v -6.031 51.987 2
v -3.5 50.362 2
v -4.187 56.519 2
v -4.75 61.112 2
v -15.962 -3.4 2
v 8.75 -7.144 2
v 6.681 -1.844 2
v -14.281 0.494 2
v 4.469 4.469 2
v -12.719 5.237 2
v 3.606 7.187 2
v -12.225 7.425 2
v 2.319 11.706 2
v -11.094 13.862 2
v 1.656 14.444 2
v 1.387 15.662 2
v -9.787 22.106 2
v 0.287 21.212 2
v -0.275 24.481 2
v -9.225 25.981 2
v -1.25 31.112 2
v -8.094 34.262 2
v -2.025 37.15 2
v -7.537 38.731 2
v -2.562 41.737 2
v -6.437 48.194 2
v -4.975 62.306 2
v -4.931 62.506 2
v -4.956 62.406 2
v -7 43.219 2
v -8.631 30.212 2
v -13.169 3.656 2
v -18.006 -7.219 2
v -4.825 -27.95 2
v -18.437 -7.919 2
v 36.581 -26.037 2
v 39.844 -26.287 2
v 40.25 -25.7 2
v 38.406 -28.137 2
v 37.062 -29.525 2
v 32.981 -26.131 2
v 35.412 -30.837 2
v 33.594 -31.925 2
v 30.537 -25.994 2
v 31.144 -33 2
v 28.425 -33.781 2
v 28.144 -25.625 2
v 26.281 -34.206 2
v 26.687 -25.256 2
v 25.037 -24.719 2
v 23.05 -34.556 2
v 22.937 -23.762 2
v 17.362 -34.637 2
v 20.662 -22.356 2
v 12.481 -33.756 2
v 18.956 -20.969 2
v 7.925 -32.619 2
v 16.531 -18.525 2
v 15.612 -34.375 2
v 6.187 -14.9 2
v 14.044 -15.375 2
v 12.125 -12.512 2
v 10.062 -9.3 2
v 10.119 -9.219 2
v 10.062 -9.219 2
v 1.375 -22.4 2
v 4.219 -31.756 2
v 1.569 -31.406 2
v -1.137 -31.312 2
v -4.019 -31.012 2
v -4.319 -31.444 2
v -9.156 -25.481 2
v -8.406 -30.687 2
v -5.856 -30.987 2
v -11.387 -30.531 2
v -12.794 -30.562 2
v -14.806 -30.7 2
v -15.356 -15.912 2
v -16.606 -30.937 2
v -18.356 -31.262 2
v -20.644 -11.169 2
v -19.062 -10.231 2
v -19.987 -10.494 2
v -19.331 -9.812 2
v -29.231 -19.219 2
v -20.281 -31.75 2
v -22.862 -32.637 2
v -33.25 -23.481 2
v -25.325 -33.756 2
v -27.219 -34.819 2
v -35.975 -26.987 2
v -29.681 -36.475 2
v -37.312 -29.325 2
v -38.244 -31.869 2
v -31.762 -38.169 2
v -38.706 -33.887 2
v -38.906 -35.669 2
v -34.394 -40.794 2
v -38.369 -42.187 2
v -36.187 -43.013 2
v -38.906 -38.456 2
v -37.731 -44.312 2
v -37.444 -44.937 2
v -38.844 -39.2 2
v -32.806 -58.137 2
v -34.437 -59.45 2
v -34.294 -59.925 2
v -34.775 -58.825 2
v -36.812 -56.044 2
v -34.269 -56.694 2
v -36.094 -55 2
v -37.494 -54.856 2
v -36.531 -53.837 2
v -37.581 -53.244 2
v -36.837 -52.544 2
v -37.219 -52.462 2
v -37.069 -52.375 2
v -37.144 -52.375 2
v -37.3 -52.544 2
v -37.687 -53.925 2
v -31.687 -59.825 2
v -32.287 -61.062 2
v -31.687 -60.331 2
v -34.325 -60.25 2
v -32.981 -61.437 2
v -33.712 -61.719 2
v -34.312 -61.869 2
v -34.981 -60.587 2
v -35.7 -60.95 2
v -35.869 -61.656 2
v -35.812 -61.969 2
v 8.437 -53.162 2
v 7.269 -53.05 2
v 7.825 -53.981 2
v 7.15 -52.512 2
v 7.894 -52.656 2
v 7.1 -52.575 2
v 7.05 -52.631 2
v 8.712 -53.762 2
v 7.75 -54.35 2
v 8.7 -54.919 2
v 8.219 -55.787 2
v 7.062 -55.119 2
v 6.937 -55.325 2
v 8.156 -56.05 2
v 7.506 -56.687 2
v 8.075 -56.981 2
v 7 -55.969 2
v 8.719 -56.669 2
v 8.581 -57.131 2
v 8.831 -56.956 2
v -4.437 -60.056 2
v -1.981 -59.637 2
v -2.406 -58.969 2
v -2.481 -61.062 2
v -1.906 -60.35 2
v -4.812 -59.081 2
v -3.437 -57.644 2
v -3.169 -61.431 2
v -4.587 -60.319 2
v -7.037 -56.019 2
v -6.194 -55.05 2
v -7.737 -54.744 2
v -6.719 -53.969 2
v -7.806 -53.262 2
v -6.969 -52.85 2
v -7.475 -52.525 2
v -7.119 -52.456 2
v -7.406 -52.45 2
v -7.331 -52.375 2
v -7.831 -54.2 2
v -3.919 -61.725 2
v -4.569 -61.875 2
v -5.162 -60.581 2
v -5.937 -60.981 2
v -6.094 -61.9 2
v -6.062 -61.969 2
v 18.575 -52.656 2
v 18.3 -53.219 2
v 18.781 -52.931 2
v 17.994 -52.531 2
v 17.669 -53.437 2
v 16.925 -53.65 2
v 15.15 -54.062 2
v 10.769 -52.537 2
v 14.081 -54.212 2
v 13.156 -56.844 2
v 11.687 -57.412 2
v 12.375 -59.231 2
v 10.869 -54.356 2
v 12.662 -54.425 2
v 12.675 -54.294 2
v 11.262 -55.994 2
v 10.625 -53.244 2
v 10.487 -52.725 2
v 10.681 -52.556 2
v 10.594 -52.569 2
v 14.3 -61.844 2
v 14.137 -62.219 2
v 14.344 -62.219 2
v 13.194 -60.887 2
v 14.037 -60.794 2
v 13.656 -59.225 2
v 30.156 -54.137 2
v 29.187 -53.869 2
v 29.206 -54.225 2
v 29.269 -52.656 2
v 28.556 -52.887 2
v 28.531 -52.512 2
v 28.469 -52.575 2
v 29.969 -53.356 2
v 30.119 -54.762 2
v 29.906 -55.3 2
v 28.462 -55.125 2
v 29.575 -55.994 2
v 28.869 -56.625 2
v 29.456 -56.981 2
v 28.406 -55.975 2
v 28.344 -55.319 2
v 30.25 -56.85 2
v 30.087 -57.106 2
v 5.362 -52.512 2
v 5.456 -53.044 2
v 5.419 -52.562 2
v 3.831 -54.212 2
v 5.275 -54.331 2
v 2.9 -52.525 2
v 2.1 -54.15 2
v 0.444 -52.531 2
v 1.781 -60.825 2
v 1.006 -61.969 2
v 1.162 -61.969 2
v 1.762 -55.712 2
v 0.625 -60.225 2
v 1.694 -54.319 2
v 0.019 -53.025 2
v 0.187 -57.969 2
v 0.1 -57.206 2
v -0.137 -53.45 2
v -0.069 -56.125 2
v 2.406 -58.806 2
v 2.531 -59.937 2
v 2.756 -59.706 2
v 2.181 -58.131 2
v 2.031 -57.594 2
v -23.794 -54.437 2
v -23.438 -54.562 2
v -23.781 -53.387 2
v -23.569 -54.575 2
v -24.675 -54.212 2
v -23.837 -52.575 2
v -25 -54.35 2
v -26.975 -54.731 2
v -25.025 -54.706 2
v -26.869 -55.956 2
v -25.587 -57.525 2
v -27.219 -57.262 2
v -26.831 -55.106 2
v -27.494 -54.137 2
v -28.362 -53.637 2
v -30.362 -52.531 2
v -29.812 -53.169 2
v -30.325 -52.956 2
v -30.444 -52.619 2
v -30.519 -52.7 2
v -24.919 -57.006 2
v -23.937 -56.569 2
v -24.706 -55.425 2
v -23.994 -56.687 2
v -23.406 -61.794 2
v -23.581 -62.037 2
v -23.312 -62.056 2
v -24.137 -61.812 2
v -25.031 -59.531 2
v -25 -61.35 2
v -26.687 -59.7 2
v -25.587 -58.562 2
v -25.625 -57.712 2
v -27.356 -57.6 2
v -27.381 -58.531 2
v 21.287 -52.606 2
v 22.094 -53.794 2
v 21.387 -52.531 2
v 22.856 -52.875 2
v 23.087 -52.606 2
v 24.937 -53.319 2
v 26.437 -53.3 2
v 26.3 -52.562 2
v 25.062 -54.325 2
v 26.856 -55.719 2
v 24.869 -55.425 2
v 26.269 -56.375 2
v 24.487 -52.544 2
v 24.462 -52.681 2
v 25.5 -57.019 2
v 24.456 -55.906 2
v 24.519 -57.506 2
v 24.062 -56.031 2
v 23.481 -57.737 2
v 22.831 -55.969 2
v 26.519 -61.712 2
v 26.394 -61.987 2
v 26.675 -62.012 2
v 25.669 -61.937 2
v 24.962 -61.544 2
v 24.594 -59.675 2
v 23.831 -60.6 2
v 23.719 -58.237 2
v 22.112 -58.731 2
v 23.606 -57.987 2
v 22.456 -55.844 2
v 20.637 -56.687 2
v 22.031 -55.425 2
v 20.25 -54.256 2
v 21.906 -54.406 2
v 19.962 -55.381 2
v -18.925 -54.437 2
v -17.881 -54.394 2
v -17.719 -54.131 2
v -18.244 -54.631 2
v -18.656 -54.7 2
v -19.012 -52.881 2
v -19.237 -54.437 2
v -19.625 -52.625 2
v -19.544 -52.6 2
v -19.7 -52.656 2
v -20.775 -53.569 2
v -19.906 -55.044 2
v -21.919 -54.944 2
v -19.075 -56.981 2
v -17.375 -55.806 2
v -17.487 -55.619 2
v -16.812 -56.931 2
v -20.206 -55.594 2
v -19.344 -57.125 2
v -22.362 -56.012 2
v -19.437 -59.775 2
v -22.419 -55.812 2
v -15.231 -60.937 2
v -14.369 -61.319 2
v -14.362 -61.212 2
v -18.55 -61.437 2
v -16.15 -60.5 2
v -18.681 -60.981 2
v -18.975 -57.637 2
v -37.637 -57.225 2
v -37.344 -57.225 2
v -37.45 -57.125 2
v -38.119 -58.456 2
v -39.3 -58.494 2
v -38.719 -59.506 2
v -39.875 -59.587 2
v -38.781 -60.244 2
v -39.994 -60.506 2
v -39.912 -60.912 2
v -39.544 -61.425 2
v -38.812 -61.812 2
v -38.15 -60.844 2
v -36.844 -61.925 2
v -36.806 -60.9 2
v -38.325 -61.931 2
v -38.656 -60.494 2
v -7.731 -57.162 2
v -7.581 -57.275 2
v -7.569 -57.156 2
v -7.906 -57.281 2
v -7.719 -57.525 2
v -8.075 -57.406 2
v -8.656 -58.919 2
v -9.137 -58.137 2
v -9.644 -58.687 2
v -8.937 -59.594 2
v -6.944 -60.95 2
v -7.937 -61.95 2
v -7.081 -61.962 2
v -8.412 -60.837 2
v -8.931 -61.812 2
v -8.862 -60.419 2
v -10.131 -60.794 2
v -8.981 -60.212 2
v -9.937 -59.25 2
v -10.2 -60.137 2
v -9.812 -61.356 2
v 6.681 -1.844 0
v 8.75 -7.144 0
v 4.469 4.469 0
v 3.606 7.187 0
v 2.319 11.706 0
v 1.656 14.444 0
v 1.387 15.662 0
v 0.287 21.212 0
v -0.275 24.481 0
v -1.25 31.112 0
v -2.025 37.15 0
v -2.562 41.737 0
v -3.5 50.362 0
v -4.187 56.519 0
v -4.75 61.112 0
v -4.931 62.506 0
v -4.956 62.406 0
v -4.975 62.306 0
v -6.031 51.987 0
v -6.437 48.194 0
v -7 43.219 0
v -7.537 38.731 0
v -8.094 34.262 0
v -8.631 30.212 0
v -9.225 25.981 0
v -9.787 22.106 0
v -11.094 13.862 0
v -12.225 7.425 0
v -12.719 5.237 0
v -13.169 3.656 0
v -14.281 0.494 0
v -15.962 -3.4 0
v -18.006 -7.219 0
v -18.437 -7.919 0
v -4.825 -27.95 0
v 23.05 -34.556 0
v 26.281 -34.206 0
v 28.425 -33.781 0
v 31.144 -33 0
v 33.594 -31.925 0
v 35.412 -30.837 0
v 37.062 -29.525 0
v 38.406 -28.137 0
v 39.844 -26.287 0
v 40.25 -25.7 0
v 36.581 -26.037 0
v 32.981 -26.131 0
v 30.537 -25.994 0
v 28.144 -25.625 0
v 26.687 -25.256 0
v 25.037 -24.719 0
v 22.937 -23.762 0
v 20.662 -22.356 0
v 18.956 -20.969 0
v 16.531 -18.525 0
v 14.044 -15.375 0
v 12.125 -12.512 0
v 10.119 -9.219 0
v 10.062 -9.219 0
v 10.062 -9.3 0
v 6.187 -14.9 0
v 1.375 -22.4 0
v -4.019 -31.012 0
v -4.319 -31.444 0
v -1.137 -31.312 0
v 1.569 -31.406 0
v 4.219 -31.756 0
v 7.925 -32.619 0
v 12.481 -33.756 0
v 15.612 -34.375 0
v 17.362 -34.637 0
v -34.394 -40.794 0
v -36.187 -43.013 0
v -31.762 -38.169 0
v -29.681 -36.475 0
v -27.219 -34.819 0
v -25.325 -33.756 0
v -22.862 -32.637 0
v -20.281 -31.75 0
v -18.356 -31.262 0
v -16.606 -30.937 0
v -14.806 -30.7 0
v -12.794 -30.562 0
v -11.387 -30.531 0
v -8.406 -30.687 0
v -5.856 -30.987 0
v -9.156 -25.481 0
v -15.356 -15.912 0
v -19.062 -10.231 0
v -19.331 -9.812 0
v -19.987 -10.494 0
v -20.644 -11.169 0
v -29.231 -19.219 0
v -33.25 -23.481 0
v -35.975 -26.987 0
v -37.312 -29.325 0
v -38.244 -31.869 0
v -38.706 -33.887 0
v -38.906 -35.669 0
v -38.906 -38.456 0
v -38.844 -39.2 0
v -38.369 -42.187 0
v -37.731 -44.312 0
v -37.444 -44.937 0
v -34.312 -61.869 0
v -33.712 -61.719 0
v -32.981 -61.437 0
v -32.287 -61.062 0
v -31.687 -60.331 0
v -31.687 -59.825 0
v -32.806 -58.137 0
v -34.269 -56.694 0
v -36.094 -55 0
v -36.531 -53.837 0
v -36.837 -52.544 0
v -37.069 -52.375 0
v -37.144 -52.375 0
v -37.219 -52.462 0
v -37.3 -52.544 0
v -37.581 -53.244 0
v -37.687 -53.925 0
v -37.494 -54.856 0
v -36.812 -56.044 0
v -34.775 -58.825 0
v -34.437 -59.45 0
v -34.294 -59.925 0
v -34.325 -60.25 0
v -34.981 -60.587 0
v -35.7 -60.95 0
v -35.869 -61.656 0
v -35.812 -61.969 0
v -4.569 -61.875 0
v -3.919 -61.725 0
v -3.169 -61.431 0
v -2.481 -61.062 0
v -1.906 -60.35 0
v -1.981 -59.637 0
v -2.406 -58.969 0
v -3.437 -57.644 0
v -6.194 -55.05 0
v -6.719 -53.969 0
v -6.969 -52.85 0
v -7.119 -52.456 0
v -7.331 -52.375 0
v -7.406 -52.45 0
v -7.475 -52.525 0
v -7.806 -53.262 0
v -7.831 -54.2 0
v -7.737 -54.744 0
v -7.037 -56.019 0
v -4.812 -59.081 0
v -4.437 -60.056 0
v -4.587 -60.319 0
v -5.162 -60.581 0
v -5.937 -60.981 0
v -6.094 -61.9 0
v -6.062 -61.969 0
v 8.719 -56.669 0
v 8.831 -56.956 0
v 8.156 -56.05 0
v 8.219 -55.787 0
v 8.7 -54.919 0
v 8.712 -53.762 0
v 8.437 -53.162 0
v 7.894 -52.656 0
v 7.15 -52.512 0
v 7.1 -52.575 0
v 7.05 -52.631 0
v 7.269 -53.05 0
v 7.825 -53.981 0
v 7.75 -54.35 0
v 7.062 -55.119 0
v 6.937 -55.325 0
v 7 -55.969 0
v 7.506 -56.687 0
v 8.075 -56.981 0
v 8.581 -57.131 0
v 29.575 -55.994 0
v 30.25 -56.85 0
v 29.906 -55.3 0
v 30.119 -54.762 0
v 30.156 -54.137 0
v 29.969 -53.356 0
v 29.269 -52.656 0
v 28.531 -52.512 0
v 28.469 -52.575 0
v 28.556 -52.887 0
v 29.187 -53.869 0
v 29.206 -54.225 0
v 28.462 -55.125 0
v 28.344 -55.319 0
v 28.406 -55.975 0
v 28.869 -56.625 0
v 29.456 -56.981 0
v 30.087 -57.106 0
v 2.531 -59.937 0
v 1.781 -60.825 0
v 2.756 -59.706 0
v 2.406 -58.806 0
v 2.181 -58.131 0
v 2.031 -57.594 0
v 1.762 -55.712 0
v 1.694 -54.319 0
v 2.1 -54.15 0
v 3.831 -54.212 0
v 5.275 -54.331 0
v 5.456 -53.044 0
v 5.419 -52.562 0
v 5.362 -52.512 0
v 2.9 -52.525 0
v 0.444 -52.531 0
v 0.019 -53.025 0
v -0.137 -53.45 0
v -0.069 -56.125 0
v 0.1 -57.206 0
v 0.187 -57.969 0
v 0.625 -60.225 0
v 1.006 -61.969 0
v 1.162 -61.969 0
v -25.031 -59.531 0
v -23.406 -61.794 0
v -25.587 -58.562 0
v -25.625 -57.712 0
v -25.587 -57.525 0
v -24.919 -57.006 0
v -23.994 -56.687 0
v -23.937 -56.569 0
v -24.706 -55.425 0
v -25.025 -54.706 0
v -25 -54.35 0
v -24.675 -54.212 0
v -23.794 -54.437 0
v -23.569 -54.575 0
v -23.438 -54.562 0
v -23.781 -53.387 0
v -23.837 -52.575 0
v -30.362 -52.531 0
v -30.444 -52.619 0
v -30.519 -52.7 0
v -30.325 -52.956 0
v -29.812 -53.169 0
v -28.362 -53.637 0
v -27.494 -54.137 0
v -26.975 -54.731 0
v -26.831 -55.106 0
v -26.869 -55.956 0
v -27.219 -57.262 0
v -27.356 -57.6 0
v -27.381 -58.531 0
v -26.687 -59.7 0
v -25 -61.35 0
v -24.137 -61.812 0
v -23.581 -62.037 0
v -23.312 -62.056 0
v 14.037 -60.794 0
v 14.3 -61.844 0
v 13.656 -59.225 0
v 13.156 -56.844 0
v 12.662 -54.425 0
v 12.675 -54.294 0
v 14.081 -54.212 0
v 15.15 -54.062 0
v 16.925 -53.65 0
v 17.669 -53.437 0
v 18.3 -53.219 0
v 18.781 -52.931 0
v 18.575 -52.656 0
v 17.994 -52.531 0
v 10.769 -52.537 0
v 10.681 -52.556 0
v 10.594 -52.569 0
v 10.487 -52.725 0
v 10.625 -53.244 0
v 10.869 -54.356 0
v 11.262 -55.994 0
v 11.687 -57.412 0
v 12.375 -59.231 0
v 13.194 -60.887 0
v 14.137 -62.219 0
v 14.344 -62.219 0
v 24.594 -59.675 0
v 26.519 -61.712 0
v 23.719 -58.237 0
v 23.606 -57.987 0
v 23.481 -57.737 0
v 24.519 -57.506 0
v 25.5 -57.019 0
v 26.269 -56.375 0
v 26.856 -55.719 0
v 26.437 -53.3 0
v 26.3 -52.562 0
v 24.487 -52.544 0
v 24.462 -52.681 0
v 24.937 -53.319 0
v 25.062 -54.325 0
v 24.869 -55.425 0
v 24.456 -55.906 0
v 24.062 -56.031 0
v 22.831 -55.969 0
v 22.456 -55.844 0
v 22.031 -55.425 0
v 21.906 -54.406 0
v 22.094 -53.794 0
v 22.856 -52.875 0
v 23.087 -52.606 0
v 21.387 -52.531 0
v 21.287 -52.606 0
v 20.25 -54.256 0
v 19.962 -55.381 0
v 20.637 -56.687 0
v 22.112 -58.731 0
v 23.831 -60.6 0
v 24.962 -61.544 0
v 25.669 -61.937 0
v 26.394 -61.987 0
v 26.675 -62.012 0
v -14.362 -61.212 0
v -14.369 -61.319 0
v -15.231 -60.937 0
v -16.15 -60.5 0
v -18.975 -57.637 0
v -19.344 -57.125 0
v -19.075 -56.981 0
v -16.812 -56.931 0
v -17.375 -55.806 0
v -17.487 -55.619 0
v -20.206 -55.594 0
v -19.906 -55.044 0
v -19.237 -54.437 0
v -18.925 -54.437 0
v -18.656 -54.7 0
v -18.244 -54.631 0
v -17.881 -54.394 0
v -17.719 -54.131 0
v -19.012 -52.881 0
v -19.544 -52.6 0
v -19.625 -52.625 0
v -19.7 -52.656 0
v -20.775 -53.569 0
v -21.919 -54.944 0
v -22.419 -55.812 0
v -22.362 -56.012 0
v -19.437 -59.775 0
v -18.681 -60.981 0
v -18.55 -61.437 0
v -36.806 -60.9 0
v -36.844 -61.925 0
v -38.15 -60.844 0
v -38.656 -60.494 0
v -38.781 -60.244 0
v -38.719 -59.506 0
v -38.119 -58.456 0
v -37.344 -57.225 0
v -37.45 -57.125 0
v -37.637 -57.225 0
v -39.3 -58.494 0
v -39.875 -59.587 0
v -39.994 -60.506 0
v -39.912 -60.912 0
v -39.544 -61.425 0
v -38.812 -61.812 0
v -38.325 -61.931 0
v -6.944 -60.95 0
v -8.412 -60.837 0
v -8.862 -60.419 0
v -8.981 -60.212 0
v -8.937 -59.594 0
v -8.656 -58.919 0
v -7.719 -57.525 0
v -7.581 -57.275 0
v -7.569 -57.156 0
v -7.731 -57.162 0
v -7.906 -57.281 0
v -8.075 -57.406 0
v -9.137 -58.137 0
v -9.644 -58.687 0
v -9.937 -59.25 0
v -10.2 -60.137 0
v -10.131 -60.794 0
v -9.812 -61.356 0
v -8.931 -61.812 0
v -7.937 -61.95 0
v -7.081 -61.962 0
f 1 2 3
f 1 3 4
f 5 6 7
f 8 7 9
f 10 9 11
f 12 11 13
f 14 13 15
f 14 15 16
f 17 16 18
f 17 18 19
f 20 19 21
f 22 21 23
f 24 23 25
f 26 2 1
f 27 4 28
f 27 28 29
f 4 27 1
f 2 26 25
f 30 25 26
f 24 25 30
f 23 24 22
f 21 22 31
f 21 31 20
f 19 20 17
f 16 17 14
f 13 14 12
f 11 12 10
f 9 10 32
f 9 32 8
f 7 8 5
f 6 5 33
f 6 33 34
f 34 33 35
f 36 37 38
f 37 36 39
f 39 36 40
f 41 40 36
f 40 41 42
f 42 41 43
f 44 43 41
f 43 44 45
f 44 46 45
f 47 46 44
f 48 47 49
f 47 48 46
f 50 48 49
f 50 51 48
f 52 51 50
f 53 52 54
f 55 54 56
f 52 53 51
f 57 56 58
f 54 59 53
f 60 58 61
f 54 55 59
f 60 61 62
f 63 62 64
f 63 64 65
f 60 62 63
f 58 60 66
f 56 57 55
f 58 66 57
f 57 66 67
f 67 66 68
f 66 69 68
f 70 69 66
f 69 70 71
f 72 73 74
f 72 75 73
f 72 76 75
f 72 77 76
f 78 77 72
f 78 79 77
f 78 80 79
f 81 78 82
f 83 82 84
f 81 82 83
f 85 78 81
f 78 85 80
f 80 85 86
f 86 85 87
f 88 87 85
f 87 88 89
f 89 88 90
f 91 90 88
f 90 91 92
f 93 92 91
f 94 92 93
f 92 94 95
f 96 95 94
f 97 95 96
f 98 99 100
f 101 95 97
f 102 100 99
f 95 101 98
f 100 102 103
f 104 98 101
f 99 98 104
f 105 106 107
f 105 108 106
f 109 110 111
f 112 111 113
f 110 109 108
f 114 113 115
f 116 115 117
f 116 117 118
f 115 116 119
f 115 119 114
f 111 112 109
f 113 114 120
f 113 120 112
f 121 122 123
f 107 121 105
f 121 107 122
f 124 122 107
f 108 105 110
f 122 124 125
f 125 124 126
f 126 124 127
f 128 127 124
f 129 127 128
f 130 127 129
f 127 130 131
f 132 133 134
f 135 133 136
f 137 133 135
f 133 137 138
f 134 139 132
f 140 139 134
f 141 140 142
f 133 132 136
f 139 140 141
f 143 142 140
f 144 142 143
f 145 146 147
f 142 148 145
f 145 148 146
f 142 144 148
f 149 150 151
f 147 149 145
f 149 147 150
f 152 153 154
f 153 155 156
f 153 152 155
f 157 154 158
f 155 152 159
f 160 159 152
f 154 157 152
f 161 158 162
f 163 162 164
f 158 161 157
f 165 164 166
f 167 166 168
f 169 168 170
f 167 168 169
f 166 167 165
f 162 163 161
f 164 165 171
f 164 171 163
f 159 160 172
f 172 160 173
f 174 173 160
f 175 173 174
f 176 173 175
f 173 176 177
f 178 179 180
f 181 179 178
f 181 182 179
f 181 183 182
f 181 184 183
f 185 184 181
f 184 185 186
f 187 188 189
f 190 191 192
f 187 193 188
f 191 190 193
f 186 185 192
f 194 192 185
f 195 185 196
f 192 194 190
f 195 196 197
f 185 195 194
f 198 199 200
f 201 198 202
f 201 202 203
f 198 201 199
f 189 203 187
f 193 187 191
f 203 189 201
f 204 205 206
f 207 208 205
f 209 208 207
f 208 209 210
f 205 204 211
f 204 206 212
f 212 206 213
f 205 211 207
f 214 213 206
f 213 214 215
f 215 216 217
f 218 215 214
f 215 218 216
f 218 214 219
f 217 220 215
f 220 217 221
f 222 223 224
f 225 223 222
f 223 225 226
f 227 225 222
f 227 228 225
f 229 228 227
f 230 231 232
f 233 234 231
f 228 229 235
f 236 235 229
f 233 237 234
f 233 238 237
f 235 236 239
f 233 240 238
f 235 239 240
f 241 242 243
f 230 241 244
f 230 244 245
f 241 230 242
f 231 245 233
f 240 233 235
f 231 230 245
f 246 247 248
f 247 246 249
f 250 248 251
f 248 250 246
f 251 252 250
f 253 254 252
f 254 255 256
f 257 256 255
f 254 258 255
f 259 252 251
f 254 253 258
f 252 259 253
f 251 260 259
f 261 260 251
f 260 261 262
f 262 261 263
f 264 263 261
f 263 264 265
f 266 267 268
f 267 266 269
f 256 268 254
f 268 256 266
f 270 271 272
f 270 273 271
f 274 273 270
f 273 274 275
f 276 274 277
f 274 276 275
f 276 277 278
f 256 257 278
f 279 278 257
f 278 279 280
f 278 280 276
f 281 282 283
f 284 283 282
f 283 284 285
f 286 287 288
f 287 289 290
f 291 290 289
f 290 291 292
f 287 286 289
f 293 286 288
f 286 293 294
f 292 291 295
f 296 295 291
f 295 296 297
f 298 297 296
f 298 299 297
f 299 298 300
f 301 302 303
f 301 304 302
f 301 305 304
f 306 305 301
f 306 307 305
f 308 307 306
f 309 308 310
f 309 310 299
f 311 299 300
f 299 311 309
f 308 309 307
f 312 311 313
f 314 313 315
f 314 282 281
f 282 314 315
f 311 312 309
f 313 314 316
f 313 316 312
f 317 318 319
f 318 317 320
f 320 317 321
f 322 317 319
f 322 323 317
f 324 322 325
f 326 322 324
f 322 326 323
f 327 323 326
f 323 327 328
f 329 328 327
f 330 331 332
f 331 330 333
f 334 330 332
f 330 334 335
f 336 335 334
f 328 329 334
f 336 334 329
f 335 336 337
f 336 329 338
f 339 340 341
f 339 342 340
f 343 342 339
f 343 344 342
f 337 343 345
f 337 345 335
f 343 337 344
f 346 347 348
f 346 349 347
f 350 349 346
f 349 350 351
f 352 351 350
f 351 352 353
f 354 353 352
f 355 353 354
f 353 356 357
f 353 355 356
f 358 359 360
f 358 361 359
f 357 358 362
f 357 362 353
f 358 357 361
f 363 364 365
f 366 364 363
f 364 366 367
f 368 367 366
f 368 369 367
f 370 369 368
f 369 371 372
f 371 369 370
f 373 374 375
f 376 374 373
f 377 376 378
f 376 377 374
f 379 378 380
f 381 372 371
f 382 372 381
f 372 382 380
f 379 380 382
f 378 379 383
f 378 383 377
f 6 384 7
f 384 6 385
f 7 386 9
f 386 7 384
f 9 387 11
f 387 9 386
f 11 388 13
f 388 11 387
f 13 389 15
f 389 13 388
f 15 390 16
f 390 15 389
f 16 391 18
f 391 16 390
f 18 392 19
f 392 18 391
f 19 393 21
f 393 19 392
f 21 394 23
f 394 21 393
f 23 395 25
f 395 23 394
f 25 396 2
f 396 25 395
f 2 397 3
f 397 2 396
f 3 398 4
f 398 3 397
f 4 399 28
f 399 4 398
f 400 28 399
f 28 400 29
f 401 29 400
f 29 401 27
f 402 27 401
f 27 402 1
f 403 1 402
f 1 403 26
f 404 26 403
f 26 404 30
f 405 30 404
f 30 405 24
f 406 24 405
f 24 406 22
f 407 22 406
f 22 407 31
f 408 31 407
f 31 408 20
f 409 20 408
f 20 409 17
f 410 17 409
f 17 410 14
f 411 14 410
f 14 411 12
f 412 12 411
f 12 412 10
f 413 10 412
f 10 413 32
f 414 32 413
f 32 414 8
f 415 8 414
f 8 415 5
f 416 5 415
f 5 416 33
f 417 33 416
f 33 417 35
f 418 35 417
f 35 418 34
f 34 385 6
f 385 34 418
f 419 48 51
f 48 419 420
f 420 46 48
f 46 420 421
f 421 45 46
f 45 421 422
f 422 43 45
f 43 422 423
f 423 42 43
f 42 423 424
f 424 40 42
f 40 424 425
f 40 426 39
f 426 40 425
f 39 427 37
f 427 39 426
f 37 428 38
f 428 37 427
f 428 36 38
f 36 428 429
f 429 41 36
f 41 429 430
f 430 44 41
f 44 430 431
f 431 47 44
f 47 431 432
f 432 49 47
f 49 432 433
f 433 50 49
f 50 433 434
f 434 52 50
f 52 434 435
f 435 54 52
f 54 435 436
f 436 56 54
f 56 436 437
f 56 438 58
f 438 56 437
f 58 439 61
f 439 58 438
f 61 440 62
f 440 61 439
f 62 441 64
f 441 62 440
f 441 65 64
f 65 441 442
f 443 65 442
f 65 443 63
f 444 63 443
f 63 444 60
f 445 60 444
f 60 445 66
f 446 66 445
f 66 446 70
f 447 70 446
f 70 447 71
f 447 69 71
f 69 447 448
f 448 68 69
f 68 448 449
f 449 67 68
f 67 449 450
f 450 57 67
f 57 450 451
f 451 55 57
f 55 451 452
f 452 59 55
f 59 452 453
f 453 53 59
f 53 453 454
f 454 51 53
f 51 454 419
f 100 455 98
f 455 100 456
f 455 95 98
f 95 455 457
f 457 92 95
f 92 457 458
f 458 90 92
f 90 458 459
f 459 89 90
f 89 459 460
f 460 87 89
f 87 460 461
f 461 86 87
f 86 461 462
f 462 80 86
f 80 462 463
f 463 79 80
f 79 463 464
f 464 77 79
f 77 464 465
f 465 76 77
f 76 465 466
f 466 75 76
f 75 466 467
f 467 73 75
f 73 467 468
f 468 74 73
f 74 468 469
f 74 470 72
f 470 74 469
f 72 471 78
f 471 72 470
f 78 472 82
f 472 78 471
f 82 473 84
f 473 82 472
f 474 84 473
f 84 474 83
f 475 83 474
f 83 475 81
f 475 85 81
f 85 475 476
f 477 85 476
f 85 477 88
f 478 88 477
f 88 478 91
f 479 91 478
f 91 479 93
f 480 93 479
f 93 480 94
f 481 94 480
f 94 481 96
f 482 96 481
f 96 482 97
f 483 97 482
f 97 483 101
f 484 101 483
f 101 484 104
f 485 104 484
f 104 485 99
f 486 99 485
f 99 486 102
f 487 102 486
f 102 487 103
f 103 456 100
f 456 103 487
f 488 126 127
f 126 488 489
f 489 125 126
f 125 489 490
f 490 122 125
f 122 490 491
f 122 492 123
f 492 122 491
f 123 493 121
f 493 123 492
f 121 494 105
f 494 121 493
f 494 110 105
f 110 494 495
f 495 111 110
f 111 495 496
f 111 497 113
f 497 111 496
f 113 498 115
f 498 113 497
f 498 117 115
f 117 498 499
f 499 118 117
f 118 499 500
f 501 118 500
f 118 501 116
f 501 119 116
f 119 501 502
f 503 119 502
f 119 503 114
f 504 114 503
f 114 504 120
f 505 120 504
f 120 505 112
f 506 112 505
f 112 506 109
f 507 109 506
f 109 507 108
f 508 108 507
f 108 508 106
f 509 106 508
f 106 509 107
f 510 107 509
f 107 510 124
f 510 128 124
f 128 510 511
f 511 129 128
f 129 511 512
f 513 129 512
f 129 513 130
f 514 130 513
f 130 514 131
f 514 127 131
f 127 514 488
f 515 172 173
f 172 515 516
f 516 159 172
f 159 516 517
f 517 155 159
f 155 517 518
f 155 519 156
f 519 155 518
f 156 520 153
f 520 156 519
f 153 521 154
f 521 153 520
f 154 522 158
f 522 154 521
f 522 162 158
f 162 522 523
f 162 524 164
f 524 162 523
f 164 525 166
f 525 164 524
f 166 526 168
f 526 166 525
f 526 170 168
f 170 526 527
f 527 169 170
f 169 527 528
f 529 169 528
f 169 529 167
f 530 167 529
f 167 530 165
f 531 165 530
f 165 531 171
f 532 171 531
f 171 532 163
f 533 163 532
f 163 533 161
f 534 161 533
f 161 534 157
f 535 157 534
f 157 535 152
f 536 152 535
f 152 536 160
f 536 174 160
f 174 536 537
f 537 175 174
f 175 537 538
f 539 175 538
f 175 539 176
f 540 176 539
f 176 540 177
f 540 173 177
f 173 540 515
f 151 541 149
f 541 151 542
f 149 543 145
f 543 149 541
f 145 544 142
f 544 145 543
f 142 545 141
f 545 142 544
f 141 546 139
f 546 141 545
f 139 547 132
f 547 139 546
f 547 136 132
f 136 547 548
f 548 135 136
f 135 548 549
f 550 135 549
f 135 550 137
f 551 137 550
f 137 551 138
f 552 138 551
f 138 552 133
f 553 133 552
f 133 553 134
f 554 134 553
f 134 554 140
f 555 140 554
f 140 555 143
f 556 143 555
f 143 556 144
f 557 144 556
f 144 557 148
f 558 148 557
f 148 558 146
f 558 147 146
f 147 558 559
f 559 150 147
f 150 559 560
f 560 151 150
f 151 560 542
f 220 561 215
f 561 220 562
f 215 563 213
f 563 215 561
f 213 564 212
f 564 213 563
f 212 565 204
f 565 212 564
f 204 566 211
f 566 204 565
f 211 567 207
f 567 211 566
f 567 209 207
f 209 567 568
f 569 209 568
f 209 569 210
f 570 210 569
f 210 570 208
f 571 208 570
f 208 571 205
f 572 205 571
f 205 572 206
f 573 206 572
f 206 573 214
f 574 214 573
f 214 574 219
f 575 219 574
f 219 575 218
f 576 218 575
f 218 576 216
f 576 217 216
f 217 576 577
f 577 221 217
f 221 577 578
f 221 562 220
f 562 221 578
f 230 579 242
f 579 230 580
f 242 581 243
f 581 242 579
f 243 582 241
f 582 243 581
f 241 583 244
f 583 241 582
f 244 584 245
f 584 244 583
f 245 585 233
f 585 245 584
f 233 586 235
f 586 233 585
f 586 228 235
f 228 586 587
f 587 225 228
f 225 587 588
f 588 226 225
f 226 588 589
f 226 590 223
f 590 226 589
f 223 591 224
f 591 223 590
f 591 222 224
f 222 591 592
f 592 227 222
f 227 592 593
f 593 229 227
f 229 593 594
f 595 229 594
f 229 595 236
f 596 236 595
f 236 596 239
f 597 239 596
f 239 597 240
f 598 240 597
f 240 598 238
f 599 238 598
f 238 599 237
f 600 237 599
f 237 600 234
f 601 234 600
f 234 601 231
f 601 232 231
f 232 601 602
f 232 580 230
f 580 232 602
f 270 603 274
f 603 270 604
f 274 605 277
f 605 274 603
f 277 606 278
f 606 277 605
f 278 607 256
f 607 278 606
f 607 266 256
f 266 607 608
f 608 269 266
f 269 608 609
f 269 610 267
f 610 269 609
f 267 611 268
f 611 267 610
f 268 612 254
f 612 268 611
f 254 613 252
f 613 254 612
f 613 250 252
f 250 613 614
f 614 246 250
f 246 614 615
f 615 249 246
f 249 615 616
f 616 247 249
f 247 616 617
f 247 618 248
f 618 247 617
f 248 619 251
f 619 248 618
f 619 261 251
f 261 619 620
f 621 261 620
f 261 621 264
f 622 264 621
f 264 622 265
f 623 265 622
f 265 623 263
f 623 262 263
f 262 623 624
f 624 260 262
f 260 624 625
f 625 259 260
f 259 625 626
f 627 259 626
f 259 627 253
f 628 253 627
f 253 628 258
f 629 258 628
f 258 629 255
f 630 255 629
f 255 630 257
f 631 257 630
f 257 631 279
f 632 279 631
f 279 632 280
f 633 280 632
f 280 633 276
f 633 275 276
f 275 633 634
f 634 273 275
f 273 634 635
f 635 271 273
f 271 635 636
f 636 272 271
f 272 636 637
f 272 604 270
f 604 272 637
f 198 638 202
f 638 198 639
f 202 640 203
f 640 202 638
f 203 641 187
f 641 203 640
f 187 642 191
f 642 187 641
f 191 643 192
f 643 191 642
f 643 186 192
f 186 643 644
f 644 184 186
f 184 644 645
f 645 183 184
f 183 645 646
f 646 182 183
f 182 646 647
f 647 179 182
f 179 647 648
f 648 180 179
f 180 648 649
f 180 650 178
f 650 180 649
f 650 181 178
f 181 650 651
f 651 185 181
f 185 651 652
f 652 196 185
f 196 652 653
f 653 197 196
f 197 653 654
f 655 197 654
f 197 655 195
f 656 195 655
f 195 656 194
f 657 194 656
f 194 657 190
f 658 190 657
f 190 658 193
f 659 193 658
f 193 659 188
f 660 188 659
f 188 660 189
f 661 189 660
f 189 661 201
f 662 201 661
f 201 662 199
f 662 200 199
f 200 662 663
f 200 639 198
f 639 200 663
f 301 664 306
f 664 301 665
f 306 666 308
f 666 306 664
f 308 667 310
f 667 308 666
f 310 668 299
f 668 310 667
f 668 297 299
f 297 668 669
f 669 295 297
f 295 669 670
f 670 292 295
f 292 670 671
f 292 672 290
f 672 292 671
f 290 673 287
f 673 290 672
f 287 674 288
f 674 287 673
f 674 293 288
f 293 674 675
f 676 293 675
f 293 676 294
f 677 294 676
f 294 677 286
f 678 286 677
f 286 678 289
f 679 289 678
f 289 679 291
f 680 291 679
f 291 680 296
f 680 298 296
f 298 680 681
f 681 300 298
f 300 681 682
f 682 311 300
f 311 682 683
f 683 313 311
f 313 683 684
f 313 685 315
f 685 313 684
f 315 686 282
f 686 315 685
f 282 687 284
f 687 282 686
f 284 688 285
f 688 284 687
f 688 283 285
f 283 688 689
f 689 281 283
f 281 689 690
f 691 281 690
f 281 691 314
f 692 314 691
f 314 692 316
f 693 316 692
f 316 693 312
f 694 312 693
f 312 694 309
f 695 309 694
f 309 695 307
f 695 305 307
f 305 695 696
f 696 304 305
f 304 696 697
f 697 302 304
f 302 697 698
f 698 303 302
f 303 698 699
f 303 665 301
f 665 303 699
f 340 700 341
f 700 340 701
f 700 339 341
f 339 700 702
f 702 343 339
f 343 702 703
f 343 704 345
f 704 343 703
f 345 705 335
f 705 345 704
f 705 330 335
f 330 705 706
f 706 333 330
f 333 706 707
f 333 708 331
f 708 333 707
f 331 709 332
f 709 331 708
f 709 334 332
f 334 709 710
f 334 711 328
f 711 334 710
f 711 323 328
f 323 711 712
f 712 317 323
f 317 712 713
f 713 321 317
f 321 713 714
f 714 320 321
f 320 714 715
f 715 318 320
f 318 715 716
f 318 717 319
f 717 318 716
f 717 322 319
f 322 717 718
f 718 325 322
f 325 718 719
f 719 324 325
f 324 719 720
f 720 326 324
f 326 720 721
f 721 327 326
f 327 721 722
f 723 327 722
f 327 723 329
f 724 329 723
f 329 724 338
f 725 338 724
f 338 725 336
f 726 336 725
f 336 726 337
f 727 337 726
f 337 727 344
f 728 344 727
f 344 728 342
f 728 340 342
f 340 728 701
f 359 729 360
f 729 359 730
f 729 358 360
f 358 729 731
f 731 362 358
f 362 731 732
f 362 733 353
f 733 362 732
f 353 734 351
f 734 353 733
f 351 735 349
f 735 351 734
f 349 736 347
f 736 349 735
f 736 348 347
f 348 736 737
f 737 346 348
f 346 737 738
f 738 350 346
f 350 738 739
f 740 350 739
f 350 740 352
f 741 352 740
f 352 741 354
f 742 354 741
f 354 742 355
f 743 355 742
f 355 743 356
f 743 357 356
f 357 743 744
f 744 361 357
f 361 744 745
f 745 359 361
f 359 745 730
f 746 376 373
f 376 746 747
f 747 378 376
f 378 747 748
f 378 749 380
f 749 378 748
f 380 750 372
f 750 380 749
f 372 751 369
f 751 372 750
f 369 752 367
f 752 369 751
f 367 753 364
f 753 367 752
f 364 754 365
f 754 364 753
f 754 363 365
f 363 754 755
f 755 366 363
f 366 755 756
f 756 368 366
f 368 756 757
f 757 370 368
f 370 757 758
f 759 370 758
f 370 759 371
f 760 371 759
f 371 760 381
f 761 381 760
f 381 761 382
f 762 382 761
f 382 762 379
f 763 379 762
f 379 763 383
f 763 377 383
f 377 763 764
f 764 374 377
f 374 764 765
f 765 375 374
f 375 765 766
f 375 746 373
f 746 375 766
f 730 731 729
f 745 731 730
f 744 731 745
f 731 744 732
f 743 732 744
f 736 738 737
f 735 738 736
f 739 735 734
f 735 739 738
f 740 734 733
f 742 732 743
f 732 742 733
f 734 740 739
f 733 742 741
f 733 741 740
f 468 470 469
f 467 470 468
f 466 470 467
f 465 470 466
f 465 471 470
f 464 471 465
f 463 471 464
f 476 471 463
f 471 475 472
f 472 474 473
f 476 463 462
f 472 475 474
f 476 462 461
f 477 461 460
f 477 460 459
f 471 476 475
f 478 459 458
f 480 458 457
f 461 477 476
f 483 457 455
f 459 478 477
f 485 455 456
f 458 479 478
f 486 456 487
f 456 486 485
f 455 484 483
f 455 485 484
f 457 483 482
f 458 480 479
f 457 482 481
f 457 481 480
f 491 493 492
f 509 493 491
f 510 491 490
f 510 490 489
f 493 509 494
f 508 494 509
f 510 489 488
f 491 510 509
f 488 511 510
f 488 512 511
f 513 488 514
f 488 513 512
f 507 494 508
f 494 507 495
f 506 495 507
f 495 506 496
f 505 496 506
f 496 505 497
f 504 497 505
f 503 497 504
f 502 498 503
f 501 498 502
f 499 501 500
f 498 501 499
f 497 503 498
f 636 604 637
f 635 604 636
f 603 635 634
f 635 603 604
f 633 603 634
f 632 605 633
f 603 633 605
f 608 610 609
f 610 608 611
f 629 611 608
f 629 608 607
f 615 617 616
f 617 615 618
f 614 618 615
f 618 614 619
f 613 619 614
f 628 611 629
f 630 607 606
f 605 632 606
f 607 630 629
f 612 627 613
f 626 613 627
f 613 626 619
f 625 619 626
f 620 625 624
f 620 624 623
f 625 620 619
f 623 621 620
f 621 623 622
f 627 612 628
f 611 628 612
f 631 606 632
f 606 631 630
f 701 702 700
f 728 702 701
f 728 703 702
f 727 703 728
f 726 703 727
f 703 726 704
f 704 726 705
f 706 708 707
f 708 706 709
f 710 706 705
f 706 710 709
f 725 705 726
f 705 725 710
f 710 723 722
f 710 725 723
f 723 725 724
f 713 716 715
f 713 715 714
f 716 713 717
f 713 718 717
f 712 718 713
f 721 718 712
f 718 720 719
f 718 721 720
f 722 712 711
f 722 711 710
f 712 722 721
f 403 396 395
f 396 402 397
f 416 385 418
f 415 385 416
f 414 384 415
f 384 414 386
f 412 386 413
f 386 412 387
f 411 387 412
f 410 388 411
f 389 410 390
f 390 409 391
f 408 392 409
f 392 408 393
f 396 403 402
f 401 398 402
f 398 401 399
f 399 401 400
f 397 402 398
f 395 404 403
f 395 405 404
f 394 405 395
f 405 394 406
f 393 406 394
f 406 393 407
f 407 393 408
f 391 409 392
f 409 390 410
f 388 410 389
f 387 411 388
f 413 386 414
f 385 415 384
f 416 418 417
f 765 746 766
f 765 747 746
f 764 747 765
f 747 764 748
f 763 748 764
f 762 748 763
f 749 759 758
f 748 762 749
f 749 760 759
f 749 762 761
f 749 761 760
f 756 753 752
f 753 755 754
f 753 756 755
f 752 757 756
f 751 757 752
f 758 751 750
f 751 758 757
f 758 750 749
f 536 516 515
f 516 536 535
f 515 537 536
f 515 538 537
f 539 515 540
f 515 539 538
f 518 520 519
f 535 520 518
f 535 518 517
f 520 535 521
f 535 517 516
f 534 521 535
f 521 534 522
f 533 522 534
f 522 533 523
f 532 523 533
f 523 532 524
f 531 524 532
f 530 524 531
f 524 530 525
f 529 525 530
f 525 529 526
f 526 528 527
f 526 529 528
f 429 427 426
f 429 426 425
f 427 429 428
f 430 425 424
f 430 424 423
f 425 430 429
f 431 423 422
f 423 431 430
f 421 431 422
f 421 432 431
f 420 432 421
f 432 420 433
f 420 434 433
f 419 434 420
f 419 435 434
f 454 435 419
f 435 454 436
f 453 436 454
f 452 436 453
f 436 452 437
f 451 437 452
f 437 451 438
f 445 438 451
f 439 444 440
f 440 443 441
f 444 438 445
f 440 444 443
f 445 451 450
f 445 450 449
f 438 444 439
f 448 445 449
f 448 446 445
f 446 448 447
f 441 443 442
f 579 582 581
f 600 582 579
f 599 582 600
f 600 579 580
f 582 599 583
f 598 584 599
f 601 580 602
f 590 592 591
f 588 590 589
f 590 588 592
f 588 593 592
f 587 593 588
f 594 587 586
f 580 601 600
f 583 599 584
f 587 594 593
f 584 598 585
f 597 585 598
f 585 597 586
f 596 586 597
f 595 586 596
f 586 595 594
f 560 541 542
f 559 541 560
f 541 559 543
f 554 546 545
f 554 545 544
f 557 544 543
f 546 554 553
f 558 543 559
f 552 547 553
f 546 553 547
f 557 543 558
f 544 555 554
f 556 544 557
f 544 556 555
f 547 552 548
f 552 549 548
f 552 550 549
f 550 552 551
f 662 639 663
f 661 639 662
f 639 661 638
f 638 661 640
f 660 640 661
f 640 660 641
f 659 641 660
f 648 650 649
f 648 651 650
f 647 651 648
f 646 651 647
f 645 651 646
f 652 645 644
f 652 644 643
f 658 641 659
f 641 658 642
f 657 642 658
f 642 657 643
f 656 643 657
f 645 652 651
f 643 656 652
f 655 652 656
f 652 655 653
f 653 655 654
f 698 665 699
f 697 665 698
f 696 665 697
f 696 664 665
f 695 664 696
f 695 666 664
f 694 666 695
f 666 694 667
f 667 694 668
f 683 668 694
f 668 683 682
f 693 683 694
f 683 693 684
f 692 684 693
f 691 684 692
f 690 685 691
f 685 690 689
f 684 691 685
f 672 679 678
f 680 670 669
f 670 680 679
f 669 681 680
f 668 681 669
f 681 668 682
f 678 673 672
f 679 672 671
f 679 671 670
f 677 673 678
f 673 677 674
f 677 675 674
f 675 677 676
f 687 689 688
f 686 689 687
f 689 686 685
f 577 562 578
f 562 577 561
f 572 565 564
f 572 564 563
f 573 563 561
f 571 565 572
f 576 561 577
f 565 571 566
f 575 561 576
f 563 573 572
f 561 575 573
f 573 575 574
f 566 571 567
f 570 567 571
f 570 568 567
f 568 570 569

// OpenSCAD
module 5514f697e4bc7c70c16036072a6024b7_1()
{
 /* Generated by trace2scad version 20150415
    http://aggregate.org/MAKE/TRACE2SCAD/
    Optimized model has 387/4796 original points
 */
 color([0.48, 0.48, 0.48])
 assign(minx=0) /* polygon minx=39 */
 assign(miny=0) /* polygon miny=45 */
 assign(maxx=12880) /* polygon maxx=12880 */
 assign(maxy=20000) /* polygon maxy=20001 */
 assign(dx=maxx-minx)
 assign(dy=maxy-miny)
 assign(maxd=((dx>dy)?dx:dy))
 scale([1/maxd, 1/maxd, 1])
 translate([-minx-dx/2, -miny-dy/2, 0])
 linear_extrude(height=1, convexity=387)
 union() {
  union() {
   polygon([[5647,19985],[5644,19969],[5475,18318],[5410,17711],[5320,16915],[5234,16197],[5145,15482],[5059,14834],[4964,14157],[4874,13537],[4665,12218],[4484,11188],[4405,10838],[4333,10585],[4155,10079],[3886,9456],[3559,8845],[3490,8733],[5668,5528],[7840,8857],[7509,9705],[7155,10715],[7017,11150],[6811,11873],[6705,12311],[6662,12506],[6486,13394],[6396,13917],[6240,14978],[6116,15944],[6030,16678],[5880,18058],[5770,19043],[5680,19778],[5651,20001]], convexity=6);
   polygon([[8050,8518],[8050,8512],[7430,7616],[6660,6416],[5797,5038],[5749,4969],[6258,4990],[6691,4975],[7115,4919],[7708,4781],[8437,4599],[8938,4500],[9218,4458],[10128,4471],[10645,4527],[10988,4595],[11423,4720],[11815,4892],[12106,5066],[12370,5276],[12585,5498],[12815,5794],[12880,5888],[12293,5834],[11717,5819],[11326,5841],[10943,5900],[10710,5959],[10446,6045],[10110,6198],[9746,6423],[9473,6645],[9085,7036],[8687,7540],[8380,7998],[8059,8525],[8050,8525]], convexity=9);
   polygon([[3242,8321],[3137,8213],[1763,6925],[1120,6243],[684,5682],[470,5308],[321,4901],[247,4578],[215,4293],[215,3847],[225,3728],[301,3250],[403,2910],[449,2810],[650,3118],[937,3473],[1358,3893],[1691,4164],[2085,4429],[2388,4599],[2782,4778],[3195,4920],[3503,4998],[3783,5050],[4071,5088],[4393,5110],[4618,5115],[5095,5090],[5503,5042],[4975,5923],[3983,7454],[3390,8363],[3347,8430]], convexity=7);
   polygon([[485,1606],[472,1593],[427,1481],[410,1372],[441,1223],[550,1033],[876,588],[930,488],[953,412],[948,360],[843,306],[728,248],[701,135],[710,85],[950,101],[1046,125],[1163,170],[1274,230],[1370,347],[1370,428],[1191,698],[957,929],[665,1200],[595,1386],[546,1593],[509,1620],[497,1620]], convexity=8);
   polygon([[5255,1608],[5244,1596],[5191,1478],[5187,1328],[5202,1241],[5314,1037],[5670,547],[5730,391],[5706,349],[5614,307],[5490,243],[5465,96],[5470,85],[5709,100],[5813,124],[5933,171],[6043,230],[6135,344],[6123,458],[6055,565],[5890,777],[5449,1192],[5365,1365],[5325,1544],[5301,1607],[5267,1620]], convexity=8);
   polygon([[6904,1596],[6511,1595],[6443,1516],[6418,1448],[6429,1020],[6456,847],[6470,725],[6540,364],[6601,85],[6626,85],[6725,268],[6845,410],[6881,447],[6825,591],[6789,699],[6765,785],[6722,1086],[6711,1309],[6776,1336],[7053,1326],[7284,1307],[7313,1513],[7307,1590],[7298,1598]], convexity=10);
   polygon([[7576,1588],[7568,1579],[7603,1512],[7692,1363],[7680,1304],[7570,1181],[7550,1148],[7560,1045],[7641,930],[7732,883],[7813,859],[7853,887],[7835,933],[7745,1032],[7755,1074],[7832,1213],[7834,1398],[7790,1494],[7703,1575],[7584,1598]], convexity=10);
   polygon([[11000,1593],[10995,1588],[11009,1538],[11110,1381],[11113,1324],[10994,1180],[10975,1149],[10985,1044],[11059,940],[11153,883],[11254,863],[11280,904],[11172,1041],[11225,1152],[11259,1238],[11265,1338],[11235,1463],[11123,1575],[11005,1598]], convexity=10);
   polygon([[1569,1581],[1557,1568],[1588,1527],[1670,1493],[1902,1418],[2041,1338],[2124,1243],[2147,1183],[2141,1047],[2085,838],[2063,784],[2059,635],[2170,448],[2440,184],[2578,110],[2667,74],[2710,71],[2695,113],[2435,475],[2346,630],[2340,766],[2346,796],[2453,879],[2601,930],[2610,949],[2487,1132],[2436,1247],[2440,1304],[2492,1326],[2633,1290],[2669,1268],[2690,1270],[2635,1458],[2626,1588],[1582,1595]], convexity=13);
   polygon([[8149,1591],[8135,1589],[8118,1564],[8140,1481],[8179,1303],[8242,1041],[8310,814],[8420,523],[8551,258],[8702,45],[8735,45],[8728,105],[8686,273],[8625,524],[8545,905],[8466,1292],[8468,1313],[8693,1326],[8864,1350],[9148,1416],[9267,1450],[9368,1485],[9445,1531],[9412,1575],[9319,1595],[8163,1594]], convexity=9);
   polygon([[9854,1589],[9846,1583],[9680,1319],[9634,1139],[9742,930],[9978,603],[10253,304],[10434,153],[10547,90],[10663,82],[10708,78],[10683,126],[10375,452],[10235,682],[10217,722],[10197,762],[10363,799],[10520,877],[10643,980],[10737,1085],[10670,1472],[10648,1590],[10358,1593],[10354,1571],[10430,1469],[10450,1308],[10419,1132],[10353,1055],[10290,1035],[10093,1045],[10033,1065],[9965,1132],[9945,1295],[9975,1393],[10097,1540],[10134,1583],[9862,1595]], convexity=13);
   polygon([[3300,1580],[3288,1575],[3116,1429],[2933,1209],[2853,1070],[2862,1038],[3330,436],[3451,243],[3472,170],[4141,189],[4142,206],[4003,250],[3856,320],[3404,778],[3345,860],[3388,883],[3750,891],[3660,1071],[3642,1101],[3207,1105],[3255,1193],[3362,1290],[3412,1290],[3455,1248],[3521,1259],[3579,1297],[3605,1339],[3398,1539],[3313,1584]], convexity=12);
   polygon([[433,852],[418,844],[152,641],[60,466],[41,319],[54,254],[113,172],[230,110],[308,91],[545,92],[551,256],[336,265],[255,321],[235,361],[245,479],[341,647],[465,844],[448,860]], convexity=8);
   polygon([[5175,835],[5148,815],[4978,698],[4897,610],[4850,520],[4808,378],[4819,273],[4870,183],[5011,110],[5170,88],[5307,86],[5329,248],[5094,266],[5022,333],[5003,366],[5010,465],[5055,573],[5205,796],[5227,836],[5229,855],[5203,854]], convexity=8);
  }
 }
}

module 5514f697e4bc7c70c16036072a6024b7()
{
 /* all layers combined, scaled to within a 1mm cube */
 scale([1, 1, 1/1])
 difference() {
  union() {
   scale([1,1,2]) translate([0,0,-0.5]) 5514f697e4bc7c70c16036072a6024b7_1();
  }
  translate([0,0,-2]) cube([2,2,4],center=true);
 }
}

scale([125, 125, 2]) {
	5514f697e4bc7c70c16036072a6024b7();
}
